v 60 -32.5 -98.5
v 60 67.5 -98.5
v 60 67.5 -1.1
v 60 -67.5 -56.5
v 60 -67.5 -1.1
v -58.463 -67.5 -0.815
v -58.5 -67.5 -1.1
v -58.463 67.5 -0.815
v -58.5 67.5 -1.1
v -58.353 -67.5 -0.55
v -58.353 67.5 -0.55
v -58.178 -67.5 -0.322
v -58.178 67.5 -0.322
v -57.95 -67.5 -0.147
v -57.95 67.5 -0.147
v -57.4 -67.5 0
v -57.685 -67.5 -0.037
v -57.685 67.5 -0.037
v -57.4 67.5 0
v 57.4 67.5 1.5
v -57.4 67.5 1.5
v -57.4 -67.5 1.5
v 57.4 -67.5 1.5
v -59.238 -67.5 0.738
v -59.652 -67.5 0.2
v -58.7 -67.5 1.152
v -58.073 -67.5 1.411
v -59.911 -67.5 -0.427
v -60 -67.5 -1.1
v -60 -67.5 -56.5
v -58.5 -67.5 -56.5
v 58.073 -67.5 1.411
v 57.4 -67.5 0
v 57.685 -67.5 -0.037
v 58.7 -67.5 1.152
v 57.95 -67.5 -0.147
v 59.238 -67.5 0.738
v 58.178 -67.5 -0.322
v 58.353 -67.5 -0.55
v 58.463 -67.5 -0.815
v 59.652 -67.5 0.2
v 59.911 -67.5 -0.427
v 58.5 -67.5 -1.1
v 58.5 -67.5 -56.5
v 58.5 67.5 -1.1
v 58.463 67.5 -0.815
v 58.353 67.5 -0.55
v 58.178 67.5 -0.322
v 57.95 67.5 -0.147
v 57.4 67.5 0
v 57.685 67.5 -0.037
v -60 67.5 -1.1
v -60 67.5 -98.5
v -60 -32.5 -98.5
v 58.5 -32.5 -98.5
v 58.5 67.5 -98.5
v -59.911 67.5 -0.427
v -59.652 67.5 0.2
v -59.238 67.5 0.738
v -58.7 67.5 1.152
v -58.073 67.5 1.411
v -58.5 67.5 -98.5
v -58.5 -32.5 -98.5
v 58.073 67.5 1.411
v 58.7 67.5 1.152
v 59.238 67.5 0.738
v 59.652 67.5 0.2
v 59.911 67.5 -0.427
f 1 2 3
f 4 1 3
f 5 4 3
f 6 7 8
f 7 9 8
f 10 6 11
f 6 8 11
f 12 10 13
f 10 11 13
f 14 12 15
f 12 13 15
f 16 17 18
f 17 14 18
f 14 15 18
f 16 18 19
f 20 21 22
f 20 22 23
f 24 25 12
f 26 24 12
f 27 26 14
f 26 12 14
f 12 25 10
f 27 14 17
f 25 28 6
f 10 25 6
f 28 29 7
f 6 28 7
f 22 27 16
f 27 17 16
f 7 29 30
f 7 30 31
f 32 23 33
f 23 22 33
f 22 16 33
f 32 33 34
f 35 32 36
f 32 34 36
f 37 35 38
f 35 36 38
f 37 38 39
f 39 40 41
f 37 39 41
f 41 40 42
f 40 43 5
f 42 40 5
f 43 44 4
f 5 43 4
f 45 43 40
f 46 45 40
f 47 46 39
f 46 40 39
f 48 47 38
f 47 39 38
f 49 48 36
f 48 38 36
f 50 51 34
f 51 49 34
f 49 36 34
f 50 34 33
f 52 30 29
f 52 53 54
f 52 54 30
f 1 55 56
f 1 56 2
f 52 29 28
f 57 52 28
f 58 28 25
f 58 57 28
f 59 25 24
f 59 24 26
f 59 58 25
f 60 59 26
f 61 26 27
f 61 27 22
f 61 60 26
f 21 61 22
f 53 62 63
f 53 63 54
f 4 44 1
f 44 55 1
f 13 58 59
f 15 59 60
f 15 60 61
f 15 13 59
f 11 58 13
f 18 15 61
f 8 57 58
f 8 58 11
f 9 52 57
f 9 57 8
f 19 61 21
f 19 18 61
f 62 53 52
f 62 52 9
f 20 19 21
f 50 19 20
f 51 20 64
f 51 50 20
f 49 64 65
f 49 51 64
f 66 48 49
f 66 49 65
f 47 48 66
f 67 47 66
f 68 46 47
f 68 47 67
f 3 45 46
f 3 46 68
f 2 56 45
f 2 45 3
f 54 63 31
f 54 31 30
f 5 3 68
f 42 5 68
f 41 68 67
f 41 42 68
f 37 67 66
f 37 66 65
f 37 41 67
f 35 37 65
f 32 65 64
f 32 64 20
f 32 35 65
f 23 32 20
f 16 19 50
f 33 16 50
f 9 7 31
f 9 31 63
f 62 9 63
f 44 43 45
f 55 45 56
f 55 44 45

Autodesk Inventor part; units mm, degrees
ref_plane "YZ Plane" through (0, 0, 0) normal (1, 0, 0) x (0, 1, 0)
ref_plane "XZ Plane" through (0, 0, 0) normal (0, 1, 0) x (-1, 0, 0)
ref_plane "XY Plane" through (0, 0, 0) normal (0, 0, 1) x (1, 0, 0)
sketch "Эскиз5" plane through (0, 0, 0) normal (0, 0, 1) x (1, 0, 0)
  line L0 (-60, -67.5) -> (60, -67.5)
  line L1 (60, -67.5) -> (60, 67.5)
  line L2 (60, 67.5) -> (-60, 67.5)
  line L3 (-60, 67.5) -> (-60, -67.5)
  line L4 (-60, -67.5) -> (60, 67.5) construction
  line L5 (60, -67.5) -> (-60, 67.5) construction
  point P0 (0, 0)
  dimension "d64" = 120
  dimension "d65" = 135
extrude "Пластина2" add sketch "Эскиз5" along normal blind 1.5
sketch "Эскиз6" plane through (-58.5, 67.5, 1.5) normal (-1, 0, 0) x (0, -1, 0)
  line L0 (135, 0) -> (0, 0)
  line L1 (0, 0) -> (0, -100)
  line L2 (0, -100) -> (135, -100)
  line L3 (135, -100) -> (135, 0)
edge flange "Фланец1" height 100 angle 90 thickness 1.5 bend radius 1.1 thickness toward (-1, 0, 0) relief tear relief width 1.5 relief depth 0.75 corner gap 1.1 corner form 0 edges at (-60, 0, 0) (60, 0, 0) wall of the first edge with corners at (-58.5, -67.5, 1.5) (-58.5, 67.5, 1.5) (-58.5, 67.5, -98.5) (-58.5, -67.5, -98.5)
bend "Сгиб1"
corner "УглСтык1"
chamfer "УглФаска1" distance 35 distance2 42 1 edges at (-59.25, -67.5, -98.5) measured on face at (-59, -22.5, -98.5)
chamfer "УглФаска2" distance 42 distance2 35 1 edges at (59.25, -67.5, -98.5) measured on face at (19.1333, -67.5, 1)
equation "\"d67\" = Ширина_просечки"
equation "\"d68\" = Глубина_просечки"
equation "\"d69\" = Минимальный_остаток"
equation "\"d70\" = Радиус_гибки"
equation "\"d73\" = Радиус_гибки"
equation "\"d74\" = Размер_высечки"
equation "\"d75\" = Размер_зазора"
equation "\"d76\" = Радиус_Якоби"
equation "\"Ширина_просечки\" = Толщина"
equation "\"Глубина_просечки\" = 0.5 * Толщина"
equation "\"Размер_высечки\" = 4 * Толщина"
equation "\"Минимальный_остаток\" = 2 * Толщина"
equation "\"Радиус_перехода\" = Радиус_гибки"
equation "\"Радиус_Якоби\" = Радиус_гибки"
equation "\"Размер_зазора\" = Толщина"
equation "\"d2\" = Радиус_гибки"
equation "\"d66\" = Радиус_гибки"
equation "\"Радиус_гибки\" = 1.1"
equation "\"Толщина\" = 1.5"
properties material "Сталь"
